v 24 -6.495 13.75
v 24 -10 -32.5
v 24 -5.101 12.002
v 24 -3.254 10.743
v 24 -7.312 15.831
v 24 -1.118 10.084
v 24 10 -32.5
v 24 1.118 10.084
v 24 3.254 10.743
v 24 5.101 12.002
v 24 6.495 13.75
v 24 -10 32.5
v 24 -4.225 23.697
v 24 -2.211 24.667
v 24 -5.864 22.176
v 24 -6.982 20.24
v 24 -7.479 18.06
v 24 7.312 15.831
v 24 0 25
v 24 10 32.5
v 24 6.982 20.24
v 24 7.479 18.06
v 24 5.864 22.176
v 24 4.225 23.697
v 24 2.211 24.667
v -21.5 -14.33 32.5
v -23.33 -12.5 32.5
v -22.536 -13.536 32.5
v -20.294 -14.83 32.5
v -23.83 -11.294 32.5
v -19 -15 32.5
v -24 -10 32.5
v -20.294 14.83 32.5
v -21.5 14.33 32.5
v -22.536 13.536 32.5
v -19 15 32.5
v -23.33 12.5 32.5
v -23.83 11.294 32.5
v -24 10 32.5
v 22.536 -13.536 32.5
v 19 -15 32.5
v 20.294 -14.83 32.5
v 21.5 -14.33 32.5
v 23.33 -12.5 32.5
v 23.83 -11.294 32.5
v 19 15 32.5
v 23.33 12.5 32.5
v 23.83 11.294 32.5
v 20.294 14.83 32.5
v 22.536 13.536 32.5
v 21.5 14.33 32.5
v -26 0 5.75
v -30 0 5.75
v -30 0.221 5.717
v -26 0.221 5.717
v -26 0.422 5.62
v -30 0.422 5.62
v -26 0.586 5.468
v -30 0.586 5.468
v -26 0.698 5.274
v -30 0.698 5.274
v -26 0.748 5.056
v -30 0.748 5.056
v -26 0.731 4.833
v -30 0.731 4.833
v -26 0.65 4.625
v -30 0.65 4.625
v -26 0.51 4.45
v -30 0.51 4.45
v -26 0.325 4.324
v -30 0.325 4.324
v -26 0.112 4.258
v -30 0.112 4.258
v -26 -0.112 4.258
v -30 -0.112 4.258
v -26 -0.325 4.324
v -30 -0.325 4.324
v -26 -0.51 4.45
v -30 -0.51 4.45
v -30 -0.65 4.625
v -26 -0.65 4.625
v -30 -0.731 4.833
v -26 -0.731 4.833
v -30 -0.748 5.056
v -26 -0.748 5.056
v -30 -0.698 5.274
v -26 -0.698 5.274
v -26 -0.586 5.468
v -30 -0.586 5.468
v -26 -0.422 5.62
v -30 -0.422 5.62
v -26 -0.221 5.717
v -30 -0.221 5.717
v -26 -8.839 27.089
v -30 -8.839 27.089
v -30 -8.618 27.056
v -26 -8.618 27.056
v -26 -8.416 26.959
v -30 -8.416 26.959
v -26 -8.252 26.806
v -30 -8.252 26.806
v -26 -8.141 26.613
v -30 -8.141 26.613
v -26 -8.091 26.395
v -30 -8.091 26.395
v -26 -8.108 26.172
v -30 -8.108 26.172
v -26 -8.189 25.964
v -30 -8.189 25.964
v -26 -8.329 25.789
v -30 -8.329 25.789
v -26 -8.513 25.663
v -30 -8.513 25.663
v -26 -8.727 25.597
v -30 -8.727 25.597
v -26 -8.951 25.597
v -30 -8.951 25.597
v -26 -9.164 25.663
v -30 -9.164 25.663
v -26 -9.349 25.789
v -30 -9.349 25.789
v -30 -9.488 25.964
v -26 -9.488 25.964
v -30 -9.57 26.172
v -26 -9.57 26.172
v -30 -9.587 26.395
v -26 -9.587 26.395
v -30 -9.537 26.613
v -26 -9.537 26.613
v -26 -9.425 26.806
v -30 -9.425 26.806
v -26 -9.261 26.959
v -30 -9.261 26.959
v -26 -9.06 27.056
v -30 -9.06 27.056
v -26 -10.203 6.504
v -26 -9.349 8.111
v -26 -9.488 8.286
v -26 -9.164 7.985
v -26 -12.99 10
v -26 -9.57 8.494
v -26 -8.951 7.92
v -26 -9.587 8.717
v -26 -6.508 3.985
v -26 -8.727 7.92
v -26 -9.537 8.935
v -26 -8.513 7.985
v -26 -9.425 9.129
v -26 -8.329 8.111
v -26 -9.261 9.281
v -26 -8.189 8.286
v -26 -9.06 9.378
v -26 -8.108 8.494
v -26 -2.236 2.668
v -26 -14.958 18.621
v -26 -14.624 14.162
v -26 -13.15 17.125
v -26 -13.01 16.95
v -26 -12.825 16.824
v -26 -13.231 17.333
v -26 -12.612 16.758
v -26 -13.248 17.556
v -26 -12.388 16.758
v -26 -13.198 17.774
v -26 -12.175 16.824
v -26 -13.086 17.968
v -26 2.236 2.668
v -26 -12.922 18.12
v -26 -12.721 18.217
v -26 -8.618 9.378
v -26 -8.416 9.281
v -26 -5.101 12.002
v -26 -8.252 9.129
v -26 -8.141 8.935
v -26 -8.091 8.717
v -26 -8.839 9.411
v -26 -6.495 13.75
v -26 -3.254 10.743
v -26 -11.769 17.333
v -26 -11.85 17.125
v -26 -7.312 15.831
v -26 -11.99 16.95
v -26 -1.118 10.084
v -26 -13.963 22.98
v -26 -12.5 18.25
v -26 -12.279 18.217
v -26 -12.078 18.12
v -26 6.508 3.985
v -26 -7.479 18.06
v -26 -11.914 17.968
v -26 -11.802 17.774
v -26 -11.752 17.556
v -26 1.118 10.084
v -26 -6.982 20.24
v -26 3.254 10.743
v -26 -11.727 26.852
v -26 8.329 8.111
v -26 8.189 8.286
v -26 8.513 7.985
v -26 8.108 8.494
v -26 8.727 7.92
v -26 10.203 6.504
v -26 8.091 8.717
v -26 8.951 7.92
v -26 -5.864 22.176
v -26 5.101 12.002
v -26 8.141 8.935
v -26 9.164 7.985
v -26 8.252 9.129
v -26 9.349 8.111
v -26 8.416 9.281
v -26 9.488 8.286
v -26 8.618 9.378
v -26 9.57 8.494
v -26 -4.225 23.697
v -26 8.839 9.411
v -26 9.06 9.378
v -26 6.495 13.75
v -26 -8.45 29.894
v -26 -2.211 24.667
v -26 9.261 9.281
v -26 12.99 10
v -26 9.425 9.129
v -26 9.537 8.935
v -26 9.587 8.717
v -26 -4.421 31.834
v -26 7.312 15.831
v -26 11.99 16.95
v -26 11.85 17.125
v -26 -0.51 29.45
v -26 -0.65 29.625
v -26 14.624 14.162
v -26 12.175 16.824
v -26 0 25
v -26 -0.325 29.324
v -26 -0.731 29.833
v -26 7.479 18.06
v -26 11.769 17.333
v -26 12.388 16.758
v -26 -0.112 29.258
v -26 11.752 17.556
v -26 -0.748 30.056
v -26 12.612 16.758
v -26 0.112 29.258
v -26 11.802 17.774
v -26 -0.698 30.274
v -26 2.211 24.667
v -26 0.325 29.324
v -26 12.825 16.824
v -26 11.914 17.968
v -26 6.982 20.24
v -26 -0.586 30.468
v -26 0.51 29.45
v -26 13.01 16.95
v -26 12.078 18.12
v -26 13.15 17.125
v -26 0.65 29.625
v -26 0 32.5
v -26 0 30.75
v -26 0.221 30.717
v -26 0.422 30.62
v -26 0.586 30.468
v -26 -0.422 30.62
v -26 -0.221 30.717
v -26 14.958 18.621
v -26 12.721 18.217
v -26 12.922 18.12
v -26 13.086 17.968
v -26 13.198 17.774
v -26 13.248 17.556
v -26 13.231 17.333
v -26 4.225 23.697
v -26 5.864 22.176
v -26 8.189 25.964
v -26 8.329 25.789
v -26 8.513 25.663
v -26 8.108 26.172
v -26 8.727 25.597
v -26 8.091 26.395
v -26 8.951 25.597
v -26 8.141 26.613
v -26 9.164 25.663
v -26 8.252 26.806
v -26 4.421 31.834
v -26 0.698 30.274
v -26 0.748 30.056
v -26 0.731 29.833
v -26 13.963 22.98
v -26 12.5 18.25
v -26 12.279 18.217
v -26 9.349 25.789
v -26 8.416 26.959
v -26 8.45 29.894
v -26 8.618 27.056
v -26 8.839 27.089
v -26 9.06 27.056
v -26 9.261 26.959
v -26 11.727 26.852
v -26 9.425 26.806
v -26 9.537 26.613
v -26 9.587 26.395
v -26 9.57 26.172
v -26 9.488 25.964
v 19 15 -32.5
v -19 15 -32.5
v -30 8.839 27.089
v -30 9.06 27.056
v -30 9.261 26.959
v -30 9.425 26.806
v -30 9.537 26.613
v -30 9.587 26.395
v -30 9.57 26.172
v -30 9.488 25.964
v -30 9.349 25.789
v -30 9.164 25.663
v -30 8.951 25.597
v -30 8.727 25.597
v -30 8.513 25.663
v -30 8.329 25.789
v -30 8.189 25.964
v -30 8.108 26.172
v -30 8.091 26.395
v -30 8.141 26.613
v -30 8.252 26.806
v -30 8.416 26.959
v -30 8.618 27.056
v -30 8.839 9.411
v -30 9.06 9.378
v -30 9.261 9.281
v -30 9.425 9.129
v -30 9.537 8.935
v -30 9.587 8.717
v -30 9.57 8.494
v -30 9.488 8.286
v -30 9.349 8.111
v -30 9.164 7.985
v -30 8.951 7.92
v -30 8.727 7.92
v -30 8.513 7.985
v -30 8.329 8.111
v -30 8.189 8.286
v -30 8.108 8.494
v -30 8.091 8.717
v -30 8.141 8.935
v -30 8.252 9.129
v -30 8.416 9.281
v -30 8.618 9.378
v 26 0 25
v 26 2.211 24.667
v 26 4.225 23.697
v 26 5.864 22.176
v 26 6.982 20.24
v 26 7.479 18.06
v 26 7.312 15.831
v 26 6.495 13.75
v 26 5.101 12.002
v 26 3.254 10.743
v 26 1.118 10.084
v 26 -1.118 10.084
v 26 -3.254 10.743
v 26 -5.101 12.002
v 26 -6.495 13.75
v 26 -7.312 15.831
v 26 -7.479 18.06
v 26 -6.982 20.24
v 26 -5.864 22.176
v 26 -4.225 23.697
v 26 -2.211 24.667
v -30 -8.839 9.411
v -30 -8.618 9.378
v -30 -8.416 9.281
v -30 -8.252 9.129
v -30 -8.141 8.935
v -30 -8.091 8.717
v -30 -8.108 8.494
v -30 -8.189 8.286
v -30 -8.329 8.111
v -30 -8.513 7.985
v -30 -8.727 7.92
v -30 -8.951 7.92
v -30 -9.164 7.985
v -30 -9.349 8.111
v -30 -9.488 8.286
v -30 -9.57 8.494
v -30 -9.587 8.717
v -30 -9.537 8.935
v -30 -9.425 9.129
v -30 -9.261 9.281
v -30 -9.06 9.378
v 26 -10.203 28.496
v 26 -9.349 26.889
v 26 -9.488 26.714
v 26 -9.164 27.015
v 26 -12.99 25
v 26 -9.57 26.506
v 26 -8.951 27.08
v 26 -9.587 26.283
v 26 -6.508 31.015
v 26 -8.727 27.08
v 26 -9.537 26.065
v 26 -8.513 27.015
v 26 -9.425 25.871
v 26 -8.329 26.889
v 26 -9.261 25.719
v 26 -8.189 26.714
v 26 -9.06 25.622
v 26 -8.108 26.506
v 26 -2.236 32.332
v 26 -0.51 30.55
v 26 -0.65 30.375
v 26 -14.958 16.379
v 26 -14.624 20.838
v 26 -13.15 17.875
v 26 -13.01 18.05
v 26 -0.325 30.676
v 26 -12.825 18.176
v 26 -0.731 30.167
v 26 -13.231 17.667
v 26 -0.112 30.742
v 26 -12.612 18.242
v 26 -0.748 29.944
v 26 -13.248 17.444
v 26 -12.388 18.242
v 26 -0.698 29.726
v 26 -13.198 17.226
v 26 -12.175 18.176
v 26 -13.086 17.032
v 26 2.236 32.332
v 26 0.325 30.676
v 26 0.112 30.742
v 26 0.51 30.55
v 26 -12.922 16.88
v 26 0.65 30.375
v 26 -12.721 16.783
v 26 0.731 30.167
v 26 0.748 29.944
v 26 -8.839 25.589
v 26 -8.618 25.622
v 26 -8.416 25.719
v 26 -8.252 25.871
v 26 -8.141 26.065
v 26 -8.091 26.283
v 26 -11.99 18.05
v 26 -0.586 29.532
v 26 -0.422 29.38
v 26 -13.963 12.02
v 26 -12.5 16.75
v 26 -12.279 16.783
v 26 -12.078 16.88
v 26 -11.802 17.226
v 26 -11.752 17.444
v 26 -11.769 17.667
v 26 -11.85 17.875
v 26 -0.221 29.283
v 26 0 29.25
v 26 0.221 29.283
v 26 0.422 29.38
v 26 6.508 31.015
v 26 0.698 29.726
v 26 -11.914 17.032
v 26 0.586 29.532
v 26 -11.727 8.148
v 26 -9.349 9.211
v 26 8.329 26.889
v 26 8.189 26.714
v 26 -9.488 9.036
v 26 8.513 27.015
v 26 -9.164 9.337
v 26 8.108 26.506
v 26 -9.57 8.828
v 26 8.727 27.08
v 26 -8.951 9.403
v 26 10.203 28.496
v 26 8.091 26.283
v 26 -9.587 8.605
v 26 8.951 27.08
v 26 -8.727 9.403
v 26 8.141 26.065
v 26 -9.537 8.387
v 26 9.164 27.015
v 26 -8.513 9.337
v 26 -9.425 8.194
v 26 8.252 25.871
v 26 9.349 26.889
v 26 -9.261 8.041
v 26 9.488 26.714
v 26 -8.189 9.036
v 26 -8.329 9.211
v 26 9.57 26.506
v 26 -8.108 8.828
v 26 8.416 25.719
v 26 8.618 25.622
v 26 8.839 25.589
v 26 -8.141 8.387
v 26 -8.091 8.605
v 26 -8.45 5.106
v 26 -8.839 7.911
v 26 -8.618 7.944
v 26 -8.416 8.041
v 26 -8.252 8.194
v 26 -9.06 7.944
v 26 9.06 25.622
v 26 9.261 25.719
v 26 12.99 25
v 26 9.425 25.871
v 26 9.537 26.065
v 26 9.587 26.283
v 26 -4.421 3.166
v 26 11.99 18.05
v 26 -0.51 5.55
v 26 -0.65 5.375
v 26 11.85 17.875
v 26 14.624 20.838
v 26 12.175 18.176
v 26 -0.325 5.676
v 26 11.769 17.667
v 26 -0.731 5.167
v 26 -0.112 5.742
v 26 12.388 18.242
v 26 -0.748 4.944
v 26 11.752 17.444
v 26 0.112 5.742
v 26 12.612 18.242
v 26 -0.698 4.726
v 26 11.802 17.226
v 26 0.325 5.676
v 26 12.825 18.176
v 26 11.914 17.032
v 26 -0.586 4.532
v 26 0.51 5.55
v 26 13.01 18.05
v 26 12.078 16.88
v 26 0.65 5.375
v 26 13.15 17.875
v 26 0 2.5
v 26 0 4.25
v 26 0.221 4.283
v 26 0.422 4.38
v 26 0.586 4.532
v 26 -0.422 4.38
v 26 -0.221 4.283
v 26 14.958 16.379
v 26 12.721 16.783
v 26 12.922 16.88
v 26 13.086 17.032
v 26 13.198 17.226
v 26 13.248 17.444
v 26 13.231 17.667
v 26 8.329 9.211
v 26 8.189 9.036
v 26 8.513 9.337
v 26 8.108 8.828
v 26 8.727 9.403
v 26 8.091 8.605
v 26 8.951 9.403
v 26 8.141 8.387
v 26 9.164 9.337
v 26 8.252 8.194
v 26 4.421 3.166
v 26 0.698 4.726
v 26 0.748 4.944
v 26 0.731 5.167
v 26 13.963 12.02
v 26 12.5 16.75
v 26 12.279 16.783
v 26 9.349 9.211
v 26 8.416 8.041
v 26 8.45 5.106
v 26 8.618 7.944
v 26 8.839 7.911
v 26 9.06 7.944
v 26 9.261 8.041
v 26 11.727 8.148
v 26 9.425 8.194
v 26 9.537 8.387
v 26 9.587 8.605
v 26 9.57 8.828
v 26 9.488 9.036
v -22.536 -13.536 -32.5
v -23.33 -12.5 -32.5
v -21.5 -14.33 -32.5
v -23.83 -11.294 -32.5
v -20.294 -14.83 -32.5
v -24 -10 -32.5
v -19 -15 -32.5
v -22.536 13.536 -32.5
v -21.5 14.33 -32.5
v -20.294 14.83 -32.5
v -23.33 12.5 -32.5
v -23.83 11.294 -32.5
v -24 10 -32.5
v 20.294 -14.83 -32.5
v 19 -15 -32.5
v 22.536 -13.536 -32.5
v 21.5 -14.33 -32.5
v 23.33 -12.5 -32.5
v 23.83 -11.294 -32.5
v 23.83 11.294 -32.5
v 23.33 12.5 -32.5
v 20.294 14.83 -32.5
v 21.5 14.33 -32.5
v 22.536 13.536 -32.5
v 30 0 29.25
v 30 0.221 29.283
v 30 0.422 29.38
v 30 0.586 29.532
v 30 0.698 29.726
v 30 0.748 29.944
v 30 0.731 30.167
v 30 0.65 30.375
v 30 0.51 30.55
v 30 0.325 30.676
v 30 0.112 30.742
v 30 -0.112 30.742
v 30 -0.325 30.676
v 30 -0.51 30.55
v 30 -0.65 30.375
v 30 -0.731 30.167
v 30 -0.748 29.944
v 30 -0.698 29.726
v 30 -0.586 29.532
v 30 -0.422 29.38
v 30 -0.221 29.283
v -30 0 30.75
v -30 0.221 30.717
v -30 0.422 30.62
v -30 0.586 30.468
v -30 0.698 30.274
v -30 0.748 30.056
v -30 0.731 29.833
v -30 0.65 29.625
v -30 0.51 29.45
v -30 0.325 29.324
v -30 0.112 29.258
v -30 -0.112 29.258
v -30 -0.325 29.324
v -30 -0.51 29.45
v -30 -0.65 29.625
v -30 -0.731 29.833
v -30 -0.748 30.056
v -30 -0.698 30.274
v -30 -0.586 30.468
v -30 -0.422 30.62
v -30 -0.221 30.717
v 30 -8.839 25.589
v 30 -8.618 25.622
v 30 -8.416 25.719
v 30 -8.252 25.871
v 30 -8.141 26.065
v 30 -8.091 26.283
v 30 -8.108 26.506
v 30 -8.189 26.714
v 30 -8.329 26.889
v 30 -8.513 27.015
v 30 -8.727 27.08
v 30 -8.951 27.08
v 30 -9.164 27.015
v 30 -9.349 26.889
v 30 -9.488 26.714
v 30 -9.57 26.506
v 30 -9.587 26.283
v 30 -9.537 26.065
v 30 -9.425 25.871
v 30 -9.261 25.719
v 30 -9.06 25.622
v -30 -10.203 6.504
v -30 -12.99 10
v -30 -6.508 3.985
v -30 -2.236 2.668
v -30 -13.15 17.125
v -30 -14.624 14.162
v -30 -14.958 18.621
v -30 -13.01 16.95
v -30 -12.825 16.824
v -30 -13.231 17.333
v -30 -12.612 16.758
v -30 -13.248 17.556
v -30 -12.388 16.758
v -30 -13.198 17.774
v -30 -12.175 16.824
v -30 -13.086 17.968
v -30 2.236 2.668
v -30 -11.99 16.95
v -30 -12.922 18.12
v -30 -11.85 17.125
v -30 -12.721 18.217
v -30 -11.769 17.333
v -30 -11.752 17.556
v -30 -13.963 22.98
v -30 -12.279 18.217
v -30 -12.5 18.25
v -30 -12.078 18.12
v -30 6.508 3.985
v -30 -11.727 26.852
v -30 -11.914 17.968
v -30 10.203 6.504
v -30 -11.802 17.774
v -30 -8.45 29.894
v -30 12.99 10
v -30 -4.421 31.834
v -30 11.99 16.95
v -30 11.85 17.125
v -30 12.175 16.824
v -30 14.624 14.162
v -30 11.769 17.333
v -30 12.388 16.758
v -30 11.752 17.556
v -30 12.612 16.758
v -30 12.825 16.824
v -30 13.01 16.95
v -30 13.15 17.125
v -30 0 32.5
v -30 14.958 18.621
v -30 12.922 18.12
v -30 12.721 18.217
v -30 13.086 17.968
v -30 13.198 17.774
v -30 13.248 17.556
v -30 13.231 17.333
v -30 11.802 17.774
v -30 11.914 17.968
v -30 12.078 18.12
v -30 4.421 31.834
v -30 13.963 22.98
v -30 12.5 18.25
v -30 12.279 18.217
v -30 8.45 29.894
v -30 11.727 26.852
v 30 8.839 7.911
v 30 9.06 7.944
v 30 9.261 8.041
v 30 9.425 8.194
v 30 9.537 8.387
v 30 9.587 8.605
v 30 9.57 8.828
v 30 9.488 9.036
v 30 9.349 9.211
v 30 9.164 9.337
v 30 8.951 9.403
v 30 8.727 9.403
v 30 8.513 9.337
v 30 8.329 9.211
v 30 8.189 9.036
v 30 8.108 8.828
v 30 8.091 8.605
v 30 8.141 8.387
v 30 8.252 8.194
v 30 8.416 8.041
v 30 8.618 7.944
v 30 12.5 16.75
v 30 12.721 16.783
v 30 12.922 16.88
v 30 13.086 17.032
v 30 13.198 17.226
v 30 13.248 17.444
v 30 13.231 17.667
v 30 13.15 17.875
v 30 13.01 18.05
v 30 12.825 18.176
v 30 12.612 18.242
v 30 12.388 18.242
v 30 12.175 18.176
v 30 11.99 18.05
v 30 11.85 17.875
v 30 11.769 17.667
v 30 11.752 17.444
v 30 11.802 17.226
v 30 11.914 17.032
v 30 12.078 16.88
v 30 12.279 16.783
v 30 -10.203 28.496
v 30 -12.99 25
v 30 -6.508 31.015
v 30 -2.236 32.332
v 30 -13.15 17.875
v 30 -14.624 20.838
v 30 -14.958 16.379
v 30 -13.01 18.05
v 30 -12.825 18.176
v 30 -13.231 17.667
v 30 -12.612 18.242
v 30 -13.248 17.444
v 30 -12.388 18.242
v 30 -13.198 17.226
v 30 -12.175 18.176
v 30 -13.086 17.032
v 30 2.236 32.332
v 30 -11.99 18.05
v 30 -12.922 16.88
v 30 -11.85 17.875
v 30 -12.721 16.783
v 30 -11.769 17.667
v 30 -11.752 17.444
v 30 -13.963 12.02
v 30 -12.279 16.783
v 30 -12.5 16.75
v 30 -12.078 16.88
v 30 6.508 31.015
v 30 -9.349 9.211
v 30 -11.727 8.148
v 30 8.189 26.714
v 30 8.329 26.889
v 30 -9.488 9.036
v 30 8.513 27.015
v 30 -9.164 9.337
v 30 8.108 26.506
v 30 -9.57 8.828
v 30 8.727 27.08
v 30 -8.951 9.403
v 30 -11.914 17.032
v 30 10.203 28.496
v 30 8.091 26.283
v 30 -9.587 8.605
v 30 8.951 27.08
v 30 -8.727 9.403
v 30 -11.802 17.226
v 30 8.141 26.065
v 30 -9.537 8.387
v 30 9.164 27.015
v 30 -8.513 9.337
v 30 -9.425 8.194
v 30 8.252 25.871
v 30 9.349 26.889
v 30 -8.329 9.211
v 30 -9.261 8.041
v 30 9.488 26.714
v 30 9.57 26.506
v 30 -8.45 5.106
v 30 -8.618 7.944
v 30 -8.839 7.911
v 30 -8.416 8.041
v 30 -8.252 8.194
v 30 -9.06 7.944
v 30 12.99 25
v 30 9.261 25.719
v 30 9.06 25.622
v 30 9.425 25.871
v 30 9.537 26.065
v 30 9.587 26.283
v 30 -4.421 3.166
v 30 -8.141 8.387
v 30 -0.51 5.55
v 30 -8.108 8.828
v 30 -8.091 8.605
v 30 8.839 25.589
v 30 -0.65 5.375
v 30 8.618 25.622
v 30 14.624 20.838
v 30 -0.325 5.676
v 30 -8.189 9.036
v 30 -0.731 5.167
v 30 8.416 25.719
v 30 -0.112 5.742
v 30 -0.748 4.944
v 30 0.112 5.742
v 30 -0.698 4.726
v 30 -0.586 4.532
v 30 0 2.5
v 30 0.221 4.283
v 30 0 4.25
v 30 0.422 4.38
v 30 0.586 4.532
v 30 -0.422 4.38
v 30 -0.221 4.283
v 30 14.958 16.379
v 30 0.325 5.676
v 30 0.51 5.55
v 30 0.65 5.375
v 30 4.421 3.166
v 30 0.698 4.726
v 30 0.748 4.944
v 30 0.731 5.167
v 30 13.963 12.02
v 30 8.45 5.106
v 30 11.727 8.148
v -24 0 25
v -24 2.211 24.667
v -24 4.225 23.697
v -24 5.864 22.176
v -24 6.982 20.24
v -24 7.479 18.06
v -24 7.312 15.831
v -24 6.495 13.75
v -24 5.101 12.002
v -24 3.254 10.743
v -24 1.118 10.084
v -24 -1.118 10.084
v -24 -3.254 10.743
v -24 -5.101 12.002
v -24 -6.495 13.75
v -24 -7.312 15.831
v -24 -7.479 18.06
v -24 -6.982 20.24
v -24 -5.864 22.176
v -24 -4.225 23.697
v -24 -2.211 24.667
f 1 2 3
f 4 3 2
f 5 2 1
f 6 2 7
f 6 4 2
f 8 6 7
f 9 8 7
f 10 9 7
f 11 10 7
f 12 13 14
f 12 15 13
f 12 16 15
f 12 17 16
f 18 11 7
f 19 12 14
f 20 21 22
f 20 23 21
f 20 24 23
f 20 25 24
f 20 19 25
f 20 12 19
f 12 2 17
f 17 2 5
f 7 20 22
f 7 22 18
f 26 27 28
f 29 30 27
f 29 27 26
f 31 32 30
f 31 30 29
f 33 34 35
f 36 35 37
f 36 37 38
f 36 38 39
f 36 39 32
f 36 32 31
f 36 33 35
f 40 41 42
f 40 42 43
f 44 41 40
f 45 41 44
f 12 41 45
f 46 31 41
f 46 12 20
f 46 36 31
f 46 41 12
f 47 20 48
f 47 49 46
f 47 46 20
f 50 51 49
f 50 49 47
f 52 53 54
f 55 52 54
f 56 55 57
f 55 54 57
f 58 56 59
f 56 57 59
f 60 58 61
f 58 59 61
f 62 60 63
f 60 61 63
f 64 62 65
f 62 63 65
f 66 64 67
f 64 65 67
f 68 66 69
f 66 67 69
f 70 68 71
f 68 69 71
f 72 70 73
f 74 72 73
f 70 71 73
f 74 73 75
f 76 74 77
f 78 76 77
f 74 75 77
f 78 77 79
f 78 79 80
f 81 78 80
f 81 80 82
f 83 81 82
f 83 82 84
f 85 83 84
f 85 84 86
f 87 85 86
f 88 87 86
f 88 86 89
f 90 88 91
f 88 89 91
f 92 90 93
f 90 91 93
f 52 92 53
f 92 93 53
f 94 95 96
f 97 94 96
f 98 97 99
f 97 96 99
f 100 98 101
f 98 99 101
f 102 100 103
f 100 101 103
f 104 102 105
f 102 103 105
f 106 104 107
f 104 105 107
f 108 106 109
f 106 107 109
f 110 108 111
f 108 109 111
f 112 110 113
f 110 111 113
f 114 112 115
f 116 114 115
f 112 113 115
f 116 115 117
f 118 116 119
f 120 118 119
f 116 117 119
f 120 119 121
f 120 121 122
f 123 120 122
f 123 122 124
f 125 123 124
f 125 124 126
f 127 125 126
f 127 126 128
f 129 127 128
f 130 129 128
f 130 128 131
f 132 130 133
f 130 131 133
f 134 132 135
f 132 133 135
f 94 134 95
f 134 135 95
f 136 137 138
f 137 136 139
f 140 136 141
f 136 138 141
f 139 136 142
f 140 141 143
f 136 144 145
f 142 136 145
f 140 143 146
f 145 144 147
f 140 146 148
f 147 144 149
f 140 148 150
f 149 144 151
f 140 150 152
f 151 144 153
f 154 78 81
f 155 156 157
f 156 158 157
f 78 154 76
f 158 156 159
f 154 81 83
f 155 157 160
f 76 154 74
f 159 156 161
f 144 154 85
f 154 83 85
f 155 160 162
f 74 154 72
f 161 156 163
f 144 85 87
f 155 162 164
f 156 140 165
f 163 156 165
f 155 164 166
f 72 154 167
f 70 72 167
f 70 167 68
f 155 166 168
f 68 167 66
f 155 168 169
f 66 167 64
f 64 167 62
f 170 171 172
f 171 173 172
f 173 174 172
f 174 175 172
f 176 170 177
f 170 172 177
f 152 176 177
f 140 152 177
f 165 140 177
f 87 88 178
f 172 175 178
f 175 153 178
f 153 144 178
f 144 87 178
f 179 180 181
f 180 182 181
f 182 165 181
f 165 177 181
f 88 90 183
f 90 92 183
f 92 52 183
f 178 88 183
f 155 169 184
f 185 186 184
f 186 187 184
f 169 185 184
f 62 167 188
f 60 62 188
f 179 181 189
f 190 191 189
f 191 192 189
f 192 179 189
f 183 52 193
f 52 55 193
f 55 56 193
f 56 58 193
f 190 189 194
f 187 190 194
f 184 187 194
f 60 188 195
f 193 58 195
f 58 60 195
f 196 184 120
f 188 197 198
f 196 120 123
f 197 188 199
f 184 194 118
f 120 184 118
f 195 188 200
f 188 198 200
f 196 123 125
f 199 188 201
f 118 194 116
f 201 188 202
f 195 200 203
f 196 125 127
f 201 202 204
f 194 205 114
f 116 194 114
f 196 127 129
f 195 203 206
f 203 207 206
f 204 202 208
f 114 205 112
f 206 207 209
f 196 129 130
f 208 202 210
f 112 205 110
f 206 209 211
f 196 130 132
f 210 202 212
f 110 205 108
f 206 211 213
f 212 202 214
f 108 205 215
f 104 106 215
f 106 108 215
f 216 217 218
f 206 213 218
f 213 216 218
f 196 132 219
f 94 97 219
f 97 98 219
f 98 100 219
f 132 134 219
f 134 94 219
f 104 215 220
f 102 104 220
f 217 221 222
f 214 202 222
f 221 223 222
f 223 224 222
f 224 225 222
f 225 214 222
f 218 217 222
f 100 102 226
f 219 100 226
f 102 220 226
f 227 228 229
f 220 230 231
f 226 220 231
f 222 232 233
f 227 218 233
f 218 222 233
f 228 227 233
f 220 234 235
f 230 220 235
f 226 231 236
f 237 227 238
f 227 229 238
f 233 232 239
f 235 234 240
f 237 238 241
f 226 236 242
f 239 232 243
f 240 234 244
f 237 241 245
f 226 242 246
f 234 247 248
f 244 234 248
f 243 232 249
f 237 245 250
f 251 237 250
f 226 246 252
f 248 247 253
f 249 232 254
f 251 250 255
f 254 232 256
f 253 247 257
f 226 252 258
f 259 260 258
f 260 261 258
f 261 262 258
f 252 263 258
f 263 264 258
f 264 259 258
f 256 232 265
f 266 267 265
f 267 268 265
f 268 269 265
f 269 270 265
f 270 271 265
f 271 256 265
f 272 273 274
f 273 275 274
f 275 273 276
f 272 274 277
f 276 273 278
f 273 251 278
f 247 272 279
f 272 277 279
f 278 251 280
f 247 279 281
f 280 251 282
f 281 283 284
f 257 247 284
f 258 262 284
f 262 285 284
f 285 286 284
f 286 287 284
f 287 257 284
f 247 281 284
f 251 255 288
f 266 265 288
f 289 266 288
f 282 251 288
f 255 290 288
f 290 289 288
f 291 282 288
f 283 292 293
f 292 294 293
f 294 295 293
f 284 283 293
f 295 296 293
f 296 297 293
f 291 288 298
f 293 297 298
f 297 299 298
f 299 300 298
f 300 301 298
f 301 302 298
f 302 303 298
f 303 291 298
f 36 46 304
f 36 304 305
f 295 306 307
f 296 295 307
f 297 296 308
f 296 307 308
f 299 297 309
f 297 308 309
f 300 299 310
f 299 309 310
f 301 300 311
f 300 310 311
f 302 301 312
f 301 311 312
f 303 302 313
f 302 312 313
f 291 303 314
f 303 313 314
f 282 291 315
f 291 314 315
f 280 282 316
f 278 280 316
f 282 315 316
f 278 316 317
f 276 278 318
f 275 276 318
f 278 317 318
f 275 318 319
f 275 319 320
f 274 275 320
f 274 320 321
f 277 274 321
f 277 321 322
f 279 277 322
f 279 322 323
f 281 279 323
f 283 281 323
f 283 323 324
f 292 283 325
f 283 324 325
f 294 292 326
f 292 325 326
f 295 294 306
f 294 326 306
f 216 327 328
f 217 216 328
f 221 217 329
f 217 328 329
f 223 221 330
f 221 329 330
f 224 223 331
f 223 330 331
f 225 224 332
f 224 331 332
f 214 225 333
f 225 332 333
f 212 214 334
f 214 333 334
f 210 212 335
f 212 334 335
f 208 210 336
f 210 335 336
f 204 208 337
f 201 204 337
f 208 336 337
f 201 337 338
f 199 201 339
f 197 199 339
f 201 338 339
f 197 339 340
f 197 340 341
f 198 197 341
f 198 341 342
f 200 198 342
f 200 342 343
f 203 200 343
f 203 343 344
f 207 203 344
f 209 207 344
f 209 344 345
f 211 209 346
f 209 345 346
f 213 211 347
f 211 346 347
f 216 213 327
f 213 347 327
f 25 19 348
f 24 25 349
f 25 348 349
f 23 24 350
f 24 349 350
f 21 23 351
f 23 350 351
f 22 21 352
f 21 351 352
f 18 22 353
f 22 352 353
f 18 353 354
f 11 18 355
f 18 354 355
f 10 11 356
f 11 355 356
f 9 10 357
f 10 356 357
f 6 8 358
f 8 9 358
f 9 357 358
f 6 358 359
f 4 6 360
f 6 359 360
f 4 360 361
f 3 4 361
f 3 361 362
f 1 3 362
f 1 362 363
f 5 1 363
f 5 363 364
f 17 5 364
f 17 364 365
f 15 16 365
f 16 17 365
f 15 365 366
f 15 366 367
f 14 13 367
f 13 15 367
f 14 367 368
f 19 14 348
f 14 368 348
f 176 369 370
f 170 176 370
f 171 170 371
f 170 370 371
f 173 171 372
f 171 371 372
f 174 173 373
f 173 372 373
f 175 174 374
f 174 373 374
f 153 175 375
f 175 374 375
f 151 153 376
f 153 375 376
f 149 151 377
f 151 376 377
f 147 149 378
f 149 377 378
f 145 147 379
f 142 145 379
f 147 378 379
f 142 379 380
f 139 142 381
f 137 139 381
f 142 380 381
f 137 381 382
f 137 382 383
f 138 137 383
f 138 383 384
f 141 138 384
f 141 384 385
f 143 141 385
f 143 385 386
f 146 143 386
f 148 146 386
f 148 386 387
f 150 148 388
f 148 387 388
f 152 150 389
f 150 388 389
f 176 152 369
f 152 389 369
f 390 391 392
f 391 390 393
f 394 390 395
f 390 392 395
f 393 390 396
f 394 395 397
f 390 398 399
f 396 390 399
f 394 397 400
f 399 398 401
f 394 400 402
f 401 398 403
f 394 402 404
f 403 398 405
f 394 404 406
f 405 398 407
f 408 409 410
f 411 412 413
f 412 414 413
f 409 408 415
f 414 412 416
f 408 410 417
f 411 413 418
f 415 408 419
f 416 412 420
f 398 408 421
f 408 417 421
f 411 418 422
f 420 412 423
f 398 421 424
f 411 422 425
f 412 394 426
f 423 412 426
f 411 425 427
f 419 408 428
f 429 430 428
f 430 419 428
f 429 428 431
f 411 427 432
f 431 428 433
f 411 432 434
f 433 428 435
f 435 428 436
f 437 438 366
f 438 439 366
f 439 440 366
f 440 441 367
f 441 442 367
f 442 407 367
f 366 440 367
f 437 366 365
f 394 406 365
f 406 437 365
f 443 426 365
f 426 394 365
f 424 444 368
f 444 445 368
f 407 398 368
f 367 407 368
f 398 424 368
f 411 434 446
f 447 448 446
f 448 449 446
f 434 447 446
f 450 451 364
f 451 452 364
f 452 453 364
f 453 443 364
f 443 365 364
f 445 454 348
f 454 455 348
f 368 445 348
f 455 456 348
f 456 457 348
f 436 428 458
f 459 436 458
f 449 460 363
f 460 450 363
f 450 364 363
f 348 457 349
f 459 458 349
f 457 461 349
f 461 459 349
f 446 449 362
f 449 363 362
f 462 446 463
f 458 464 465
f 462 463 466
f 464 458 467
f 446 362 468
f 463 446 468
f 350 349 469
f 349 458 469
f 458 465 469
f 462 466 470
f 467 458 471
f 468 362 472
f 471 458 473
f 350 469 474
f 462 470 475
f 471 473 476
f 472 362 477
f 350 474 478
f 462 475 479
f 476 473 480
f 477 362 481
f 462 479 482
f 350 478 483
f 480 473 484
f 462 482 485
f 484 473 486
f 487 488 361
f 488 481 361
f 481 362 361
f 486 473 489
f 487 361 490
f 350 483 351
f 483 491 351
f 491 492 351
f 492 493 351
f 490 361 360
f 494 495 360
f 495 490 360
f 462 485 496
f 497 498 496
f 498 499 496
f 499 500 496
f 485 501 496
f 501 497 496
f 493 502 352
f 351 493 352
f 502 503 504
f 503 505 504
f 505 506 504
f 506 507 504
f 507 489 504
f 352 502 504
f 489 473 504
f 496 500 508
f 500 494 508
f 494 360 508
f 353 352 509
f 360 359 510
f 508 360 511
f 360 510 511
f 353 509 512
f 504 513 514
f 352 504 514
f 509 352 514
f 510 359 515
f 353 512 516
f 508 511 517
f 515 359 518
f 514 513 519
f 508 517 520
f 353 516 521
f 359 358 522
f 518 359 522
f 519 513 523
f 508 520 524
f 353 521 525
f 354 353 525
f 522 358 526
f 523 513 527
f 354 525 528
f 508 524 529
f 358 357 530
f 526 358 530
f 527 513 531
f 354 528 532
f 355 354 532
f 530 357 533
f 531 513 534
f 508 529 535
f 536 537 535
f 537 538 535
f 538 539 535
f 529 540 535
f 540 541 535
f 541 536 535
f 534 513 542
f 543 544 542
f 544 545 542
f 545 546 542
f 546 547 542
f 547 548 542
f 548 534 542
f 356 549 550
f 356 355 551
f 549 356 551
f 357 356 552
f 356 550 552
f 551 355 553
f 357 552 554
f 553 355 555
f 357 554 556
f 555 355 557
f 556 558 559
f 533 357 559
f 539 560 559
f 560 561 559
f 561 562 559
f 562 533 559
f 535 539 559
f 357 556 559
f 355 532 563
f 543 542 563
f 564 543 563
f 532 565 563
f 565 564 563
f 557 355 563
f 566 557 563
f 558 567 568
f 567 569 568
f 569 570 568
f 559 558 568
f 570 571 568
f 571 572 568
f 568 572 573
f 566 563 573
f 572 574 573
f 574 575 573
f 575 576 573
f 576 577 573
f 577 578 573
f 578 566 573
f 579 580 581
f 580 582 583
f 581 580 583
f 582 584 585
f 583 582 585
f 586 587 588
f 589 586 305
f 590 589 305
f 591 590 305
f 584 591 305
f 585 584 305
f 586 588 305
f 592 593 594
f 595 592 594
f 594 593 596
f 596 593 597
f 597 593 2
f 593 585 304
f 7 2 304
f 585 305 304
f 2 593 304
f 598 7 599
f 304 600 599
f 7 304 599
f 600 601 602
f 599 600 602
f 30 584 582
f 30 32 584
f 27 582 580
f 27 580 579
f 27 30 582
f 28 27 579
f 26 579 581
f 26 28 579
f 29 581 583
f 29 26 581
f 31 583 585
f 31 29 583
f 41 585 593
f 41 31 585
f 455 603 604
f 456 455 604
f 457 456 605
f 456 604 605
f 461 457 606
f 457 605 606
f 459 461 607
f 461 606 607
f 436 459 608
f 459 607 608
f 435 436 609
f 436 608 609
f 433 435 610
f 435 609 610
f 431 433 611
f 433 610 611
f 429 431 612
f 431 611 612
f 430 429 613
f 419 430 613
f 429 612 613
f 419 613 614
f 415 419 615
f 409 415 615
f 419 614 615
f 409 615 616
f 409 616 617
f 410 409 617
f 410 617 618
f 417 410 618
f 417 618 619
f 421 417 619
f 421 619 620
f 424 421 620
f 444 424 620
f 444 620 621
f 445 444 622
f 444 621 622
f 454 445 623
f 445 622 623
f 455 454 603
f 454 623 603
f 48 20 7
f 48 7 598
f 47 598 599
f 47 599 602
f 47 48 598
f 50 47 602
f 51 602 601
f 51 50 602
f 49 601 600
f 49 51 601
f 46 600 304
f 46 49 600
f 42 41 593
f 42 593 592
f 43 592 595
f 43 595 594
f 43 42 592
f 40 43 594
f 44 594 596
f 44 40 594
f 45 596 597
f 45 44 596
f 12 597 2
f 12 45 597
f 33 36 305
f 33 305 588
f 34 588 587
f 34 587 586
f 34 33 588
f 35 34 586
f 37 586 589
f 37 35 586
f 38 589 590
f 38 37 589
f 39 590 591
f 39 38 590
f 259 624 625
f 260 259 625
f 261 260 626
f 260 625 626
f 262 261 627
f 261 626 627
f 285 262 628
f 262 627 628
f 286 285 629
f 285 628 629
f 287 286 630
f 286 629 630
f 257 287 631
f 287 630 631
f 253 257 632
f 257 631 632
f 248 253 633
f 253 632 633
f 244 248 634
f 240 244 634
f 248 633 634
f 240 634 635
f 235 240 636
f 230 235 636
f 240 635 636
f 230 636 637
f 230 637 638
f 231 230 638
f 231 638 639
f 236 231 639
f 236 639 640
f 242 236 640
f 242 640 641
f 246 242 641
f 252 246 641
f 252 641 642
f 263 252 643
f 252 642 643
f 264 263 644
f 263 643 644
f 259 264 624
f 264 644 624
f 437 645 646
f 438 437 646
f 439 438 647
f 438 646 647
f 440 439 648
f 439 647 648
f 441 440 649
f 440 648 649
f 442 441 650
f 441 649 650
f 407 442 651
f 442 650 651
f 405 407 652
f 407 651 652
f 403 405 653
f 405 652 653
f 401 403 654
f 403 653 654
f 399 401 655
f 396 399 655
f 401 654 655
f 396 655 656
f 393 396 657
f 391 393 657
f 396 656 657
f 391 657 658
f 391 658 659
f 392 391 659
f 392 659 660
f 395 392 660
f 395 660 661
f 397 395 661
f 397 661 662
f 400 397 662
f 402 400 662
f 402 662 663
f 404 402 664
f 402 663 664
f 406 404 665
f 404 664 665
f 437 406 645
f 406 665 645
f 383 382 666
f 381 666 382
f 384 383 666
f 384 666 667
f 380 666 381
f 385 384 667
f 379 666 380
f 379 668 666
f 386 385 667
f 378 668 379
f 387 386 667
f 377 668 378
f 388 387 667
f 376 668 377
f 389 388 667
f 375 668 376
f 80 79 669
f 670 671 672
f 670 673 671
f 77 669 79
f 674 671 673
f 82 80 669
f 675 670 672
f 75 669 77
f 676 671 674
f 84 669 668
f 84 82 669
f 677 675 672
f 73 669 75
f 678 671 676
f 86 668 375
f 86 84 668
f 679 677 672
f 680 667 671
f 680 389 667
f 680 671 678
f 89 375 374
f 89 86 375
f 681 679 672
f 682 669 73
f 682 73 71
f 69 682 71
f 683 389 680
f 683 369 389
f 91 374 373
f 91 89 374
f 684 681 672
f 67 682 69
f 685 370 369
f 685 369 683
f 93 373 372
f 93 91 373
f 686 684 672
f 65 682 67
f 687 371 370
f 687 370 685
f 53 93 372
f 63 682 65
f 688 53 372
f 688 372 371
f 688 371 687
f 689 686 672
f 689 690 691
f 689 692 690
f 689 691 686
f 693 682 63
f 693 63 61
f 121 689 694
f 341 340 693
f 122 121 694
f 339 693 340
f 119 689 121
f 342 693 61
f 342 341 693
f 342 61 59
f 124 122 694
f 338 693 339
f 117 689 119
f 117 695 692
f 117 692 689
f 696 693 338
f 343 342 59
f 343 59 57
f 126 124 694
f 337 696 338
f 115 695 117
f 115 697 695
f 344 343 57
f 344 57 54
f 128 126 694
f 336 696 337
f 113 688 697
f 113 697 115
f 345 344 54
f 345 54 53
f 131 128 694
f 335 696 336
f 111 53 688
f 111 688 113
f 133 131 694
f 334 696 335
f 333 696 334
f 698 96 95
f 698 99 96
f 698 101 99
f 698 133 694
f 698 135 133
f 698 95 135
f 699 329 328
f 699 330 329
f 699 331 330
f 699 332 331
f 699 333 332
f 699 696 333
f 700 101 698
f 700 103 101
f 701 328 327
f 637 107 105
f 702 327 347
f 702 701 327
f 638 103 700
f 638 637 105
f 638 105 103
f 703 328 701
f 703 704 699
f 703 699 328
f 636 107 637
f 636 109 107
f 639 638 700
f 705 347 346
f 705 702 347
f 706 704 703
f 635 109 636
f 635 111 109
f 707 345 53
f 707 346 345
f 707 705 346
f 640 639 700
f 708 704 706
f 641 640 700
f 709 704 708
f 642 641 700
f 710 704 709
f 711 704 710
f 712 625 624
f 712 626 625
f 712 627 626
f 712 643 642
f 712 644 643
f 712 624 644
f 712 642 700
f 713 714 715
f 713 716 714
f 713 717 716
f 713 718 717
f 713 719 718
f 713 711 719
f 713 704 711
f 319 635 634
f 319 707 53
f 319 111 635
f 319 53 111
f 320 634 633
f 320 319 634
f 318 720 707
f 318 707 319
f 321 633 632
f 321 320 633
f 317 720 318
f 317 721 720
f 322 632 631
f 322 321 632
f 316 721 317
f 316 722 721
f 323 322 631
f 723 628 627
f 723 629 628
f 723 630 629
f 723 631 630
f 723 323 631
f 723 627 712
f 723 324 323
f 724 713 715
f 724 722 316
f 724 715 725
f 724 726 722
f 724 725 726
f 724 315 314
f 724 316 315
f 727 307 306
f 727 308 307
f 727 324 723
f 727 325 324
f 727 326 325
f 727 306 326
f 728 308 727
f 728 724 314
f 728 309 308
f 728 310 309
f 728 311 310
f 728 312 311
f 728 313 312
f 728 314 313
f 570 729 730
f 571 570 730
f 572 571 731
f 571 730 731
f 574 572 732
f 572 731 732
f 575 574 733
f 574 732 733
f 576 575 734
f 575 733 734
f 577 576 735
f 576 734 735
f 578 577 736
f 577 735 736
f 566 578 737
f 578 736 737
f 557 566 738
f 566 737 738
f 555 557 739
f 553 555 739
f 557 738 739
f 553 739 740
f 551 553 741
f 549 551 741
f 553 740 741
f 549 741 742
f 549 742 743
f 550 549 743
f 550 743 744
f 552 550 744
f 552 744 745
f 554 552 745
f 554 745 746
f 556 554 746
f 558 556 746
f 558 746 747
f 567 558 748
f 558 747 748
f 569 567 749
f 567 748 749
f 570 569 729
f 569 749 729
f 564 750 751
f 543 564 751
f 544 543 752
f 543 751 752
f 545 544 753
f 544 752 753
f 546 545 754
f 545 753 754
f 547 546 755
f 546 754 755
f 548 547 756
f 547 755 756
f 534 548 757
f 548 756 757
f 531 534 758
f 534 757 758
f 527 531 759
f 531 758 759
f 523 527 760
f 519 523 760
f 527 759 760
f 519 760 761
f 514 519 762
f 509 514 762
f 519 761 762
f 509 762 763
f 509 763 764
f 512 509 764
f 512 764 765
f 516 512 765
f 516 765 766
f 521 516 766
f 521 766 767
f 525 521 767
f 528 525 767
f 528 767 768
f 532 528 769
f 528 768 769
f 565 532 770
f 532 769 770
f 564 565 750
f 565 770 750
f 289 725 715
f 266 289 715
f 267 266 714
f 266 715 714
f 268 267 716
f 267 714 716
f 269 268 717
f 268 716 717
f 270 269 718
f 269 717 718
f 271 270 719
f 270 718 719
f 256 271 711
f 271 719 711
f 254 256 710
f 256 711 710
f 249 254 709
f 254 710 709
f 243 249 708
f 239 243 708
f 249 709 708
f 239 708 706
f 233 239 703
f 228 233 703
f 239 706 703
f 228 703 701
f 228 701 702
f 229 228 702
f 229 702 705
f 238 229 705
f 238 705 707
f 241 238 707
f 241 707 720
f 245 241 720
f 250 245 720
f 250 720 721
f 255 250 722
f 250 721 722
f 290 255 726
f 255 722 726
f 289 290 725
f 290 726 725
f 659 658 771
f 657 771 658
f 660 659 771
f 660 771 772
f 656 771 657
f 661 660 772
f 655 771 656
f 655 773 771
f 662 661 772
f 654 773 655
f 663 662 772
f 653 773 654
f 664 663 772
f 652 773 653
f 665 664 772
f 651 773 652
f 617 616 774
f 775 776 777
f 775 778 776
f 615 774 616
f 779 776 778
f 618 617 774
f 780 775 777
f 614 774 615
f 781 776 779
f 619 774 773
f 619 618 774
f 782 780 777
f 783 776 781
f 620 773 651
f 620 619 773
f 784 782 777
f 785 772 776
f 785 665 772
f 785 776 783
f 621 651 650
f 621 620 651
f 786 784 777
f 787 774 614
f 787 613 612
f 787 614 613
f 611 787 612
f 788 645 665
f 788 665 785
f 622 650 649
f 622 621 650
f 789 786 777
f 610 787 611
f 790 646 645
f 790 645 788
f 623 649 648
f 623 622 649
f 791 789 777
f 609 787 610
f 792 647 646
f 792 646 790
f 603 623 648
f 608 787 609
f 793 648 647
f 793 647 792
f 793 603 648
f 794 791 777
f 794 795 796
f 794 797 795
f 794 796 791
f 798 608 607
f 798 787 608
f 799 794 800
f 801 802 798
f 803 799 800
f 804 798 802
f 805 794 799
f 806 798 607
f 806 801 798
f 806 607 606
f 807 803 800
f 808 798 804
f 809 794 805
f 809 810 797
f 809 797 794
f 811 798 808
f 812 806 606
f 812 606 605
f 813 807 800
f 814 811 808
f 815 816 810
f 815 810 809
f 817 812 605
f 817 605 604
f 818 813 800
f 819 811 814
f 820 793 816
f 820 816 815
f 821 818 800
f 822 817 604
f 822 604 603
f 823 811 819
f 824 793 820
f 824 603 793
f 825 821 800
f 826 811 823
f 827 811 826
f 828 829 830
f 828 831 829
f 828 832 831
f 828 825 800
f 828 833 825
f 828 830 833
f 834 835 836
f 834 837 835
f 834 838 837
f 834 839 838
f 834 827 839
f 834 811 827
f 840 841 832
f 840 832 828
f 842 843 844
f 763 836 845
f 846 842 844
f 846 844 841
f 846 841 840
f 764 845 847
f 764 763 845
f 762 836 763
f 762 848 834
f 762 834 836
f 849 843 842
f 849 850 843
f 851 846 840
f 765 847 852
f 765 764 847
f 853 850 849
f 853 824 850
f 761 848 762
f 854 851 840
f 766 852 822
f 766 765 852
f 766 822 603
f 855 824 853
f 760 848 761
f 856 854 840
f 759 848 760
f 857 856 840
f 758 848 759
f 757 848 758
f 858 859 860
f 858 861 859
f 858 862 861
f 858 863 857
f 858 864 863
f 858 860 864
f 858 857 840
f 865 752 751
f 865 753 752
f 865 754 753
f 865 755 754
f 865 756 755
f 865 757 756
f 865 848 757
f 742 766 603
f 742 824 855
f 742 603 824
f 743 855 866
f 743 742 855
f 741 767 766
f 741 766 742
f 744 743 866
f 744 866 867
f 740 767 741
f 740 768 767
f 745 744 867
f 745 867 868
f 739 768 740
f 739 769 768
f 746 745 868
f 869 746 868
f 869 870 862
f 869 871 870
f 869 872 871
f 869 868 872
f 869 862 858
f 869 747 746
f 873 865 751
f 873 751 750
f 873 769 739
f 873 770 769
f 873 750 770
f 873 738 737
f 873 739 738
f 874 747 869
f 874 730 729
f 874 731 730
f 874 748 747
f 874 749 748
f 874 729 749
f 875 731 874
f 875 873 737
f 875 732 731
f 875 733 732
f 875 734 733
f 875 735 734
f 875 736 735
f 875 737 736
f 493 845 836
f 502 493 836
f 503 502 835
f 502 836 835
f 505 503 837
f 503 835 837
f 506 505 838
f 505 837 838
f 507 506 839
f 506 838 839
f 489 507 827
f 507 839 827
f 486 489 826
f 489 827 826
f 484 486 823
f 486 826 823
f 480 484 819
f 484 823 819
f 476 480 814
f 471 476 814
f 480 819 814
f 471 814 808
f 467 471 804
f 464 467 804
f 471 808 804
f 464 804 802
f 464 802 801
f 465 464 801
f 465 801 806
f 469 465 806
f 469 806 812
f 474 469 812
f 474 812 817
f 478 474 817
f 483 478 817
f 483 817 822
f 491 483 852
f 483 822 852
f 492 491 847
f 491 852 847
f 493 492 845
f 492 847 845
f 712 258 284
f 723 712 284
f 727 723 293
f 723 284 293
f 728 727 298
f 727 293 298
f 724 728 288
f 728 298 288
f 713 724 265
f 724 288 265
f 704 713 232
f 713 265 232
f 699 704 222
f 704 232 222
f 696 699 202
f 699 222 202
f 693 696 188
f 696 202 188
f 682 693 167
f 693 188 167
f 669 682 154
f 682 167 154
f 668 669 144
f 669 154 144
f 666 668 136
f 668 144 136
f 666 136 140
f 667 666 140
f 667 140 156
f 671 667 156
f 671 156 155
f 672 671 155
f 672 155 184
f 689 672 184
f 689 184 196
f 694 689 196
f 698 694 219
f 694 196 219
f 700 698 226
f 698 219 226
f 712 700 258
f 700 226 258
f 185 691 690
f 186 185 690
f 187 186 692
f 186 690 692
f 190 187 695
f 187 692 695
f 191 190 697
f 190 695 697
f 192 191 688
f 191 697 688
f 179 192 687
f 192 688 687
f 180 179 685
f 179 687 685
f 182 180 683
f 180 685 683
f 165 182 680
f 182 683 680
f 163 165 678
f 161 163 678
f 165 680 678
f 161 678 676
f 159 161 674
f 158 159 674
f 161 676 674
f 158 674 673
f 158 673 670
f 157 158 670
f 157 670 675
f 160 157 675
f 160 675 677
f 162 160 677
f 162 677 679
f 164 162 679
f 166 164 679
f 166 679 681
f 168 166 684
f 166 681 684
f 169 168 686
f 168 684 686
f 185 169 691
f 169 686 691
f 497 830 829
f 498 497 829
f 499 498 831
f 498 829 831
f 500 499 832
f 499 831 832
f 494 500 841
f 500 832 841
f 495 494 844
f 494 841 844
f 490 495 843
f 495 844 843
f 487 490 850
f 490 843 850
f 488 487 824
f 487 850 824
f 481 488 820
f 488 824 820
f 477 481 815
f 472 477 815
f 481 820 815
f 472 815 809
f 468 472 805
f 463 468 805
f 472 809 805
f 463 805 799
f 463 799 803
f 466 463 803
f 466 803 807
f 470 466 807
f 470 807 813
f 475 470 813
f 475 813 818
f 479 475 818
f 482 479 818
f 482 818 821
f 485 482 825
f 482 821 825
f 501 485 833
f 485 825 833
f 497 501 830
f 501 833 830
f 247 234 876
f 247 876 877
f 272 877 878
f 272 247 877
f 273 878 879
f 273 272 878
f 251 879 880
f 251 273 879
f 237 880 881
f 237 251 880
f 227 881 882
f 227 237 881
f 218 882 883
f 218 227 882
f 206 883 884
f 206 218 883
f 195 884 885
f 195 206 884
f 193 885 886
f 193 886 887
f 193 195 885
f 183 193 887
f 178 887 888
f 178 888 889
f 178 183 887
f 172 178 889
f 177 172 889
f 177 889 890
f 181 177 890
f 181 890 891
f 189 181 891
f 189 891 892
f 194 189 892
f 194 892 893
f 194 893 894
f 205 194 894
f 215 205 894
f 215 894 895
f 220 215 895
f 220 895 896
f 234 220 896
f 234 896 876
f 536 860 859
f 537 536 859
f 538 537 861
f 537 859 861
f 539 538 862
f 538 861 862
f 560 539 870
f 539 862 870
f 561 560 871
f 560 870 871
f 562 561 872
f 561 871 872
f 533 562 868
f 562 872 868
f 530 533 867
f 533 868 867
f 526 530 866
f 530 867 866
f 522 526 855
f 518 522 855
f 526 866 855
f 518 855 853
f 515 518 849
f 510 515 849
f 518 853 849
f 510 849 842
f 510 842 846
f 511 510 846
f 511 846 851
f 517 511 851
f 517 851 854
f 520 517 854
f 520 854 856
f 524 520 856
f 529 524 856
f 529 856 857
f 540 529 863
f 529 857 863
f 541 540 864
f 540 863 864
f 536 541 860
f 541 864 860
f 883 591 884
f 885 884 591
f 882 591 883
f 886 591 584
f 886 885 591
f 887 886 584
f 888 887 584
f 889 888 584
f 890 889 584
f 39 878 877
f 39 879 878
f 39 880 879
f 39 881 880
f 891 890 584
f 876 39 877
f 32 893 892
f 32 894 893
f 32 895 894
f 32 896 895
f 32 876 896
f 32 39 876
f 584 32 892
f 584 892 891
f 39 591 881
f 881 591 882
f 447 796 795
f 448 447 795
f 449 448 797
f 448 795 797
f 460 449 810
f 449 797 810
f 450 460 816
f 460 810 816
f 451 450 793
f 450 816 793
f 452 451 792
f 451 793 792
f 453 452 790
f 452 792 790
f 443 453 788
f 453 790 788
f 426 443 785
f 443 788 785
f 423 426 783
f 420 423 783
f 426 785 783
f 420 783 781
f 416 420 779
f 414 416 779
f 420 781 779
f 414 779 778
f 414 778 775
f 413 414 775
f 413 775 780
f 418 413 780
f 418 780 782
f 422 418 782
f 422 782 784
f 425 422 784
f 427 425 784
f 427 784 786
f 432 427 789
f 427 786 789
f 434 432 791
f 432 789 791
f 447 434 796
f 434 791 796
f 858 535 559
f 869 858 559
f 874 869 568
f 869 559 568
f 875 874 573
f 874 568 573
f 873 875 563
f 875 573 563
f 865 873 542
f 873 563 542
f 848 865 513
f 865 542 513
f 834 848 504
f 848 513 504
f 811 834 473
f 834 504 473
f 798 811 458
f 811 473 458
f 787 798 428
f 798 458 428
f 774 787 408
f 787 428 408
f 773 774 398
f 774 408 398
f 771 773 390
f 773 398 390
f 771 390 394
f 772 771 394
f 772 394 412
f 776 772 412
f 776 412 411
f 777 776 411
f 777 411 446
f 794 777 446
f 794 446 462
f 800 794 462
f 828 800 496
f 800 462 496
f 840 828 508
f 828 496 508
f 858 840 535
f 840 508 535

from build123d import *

# Parameters (mm, degrees)
BOSS_EXTRUDE1_DEPTH = 32.5
BOSS_EXTRUDE2_START = 2
SKETCH2_R           = 15
BOSS_EXTRUDE2_DEPTH = 4
SKETCH3_R           = 7.5
BOSS_EXTRUDE3_DEPTH = 50
SKETCH4_R           = 15
BOSS_EXTRUDE4_DEPTH = 4
SKETCH5_R           = 0.75
CUT_EXTRUDE1_DEPTH  = 4
SKETCH6_R           = 0.75
CUT_EXTRUDE2_DEPTH  = 4


with BuildPart() as part:
    # Sketch1 → Boss-Extrude1 (new body, symmetric)
    with BuildSketch(Plane.XY):
        with BuildLine():
            Line((-19, -15), (19, -15))
            ThreePointArc((19, -15), (22.535533906, -13.535533906), (24, -10))
            Line((24, -10), (24, 10))
            ThreePointArc((24, 10), (22.535533906, 13.535533906), (19, 15))
            Line((19, 15), (-19, 15))
            ThreePointArc((-19, 15), (-22.535533906, 13.535533906), (-24, 10))
            Line((-24, 10), (-24, -10))
            ThreePointArc((-24, -10), (-22.535533906, -13.535533906), (-19, -15))
        make_face()
    extrude(amount=BOSS_EXTRUDE1_DEPTH, both=True)



with BuildPart() as body_2:
    # Sketch2 → Boss-Extrude2 (new body)
    with BuildSketch(Plane(origin=(24, 0, 0), x_dir=(0, 0, -1), z_dir=(1, 0, 0)).offset(BOSS_EXTRUDE2_START)):
        with Locations((-17.5, 0)):
            Circle(SKETCH2_R)
    extrude(amount=BOSS_EXTRUDE2_DEPTH)


with BuildPart() as part_1:
    add(part.part)

    add(body_2.part)  # Boss-Extrude3 merges body 2
    # Sketch3 → Boss-Extrude3 (add)
    with BuildSketch(Plane.ZY.offset(-26)):
        with Locations((17.5, 0)):
            Circle(SKETCH3_R)
    boss_extrude3 = extrude(amount=BOSS_EXTRUDE3_DEPTH)

    # Mirror3: Boss-Extrude3 across plane
    add(boss_extrude3.mirror(Plane(origin=(0, 0, 0), x_dir=(0, 0, 1), z_dir=(1, 0, 0))))

    # Sketch4 → Boss-Extrude4 (add)
    with BuildSketch(Plane.ZY.offset(26)):
        with Locations((17.5, 0)):
            Circle(SKETCH4_R)
    extrude(amount=BOSS_EXTRUDE4_DEPTH)

    # Sketch5 → Cut-Extrude1 (cut)
    with BuildSketch(Plane(origin=(30, 0, 0), x_dir=(0, 0, -1), z_dir=(1, 0, 0))):
        with Locations((-17.5, 12.5)):
            Circle(SKETCH5_R)
        with Locations((-8.661165235, 8.838834765)):
            Circle(SKETCH5_R)
        with Locations((-5, 0)):
            Circle(SKETCH5_R)
        with Locations((-8.661165235, -8.838834765)):
            Circle(SKETCH5_R)
        with Locations((-17.5, -12.5)):
            Circle(SKETCH5_R)
        with Locations((-26.338834765, -8.838834765)):
            Circle(SKETCH5_R)
        with Locations((-30, 0)):
            Circle(SKETCH5_R)
        with Locations((-26.338834765, 8.838834765)):
            Circle(SKETCH5_R)
    extrude(amount=-CUT_EXTRUDE1_DEPTH, mode=Mode.SUBTRACT)

    # Sketch6 → Cut-Extrude2 (cut)
    with BuildSketch(Plane.ZY.offset(30)):
        with Locations((17.5, 12.5)):
            Circle(SKETCH6_R)
        with Locations((26.338834765, 8.838834765)):
            Circle(SKETCH6_R)
        with Locations((30, 0)):
            Circle(SKETCH6_R)
        with Locations((26.338834765, -8.838834765)):
            Circle(SKETCH6_R)
        with Locations((17.5, -12.5)):
            Circle(SKETCH6_R)
        with Locations((8.661165235, -8.838834765)):
            Circle(SKETCH6_R)
        with Locations((5, 0)):
            Circle(SKETCH6_R)
        with Locations((8.661165235, 8.838834765)):
            Circle(SKETCH6_R)
    extrude(amount=-CUT_EXTRUDE2_DEPTH, mode=Mode.SUBTRACT)


solid = part_1.part
